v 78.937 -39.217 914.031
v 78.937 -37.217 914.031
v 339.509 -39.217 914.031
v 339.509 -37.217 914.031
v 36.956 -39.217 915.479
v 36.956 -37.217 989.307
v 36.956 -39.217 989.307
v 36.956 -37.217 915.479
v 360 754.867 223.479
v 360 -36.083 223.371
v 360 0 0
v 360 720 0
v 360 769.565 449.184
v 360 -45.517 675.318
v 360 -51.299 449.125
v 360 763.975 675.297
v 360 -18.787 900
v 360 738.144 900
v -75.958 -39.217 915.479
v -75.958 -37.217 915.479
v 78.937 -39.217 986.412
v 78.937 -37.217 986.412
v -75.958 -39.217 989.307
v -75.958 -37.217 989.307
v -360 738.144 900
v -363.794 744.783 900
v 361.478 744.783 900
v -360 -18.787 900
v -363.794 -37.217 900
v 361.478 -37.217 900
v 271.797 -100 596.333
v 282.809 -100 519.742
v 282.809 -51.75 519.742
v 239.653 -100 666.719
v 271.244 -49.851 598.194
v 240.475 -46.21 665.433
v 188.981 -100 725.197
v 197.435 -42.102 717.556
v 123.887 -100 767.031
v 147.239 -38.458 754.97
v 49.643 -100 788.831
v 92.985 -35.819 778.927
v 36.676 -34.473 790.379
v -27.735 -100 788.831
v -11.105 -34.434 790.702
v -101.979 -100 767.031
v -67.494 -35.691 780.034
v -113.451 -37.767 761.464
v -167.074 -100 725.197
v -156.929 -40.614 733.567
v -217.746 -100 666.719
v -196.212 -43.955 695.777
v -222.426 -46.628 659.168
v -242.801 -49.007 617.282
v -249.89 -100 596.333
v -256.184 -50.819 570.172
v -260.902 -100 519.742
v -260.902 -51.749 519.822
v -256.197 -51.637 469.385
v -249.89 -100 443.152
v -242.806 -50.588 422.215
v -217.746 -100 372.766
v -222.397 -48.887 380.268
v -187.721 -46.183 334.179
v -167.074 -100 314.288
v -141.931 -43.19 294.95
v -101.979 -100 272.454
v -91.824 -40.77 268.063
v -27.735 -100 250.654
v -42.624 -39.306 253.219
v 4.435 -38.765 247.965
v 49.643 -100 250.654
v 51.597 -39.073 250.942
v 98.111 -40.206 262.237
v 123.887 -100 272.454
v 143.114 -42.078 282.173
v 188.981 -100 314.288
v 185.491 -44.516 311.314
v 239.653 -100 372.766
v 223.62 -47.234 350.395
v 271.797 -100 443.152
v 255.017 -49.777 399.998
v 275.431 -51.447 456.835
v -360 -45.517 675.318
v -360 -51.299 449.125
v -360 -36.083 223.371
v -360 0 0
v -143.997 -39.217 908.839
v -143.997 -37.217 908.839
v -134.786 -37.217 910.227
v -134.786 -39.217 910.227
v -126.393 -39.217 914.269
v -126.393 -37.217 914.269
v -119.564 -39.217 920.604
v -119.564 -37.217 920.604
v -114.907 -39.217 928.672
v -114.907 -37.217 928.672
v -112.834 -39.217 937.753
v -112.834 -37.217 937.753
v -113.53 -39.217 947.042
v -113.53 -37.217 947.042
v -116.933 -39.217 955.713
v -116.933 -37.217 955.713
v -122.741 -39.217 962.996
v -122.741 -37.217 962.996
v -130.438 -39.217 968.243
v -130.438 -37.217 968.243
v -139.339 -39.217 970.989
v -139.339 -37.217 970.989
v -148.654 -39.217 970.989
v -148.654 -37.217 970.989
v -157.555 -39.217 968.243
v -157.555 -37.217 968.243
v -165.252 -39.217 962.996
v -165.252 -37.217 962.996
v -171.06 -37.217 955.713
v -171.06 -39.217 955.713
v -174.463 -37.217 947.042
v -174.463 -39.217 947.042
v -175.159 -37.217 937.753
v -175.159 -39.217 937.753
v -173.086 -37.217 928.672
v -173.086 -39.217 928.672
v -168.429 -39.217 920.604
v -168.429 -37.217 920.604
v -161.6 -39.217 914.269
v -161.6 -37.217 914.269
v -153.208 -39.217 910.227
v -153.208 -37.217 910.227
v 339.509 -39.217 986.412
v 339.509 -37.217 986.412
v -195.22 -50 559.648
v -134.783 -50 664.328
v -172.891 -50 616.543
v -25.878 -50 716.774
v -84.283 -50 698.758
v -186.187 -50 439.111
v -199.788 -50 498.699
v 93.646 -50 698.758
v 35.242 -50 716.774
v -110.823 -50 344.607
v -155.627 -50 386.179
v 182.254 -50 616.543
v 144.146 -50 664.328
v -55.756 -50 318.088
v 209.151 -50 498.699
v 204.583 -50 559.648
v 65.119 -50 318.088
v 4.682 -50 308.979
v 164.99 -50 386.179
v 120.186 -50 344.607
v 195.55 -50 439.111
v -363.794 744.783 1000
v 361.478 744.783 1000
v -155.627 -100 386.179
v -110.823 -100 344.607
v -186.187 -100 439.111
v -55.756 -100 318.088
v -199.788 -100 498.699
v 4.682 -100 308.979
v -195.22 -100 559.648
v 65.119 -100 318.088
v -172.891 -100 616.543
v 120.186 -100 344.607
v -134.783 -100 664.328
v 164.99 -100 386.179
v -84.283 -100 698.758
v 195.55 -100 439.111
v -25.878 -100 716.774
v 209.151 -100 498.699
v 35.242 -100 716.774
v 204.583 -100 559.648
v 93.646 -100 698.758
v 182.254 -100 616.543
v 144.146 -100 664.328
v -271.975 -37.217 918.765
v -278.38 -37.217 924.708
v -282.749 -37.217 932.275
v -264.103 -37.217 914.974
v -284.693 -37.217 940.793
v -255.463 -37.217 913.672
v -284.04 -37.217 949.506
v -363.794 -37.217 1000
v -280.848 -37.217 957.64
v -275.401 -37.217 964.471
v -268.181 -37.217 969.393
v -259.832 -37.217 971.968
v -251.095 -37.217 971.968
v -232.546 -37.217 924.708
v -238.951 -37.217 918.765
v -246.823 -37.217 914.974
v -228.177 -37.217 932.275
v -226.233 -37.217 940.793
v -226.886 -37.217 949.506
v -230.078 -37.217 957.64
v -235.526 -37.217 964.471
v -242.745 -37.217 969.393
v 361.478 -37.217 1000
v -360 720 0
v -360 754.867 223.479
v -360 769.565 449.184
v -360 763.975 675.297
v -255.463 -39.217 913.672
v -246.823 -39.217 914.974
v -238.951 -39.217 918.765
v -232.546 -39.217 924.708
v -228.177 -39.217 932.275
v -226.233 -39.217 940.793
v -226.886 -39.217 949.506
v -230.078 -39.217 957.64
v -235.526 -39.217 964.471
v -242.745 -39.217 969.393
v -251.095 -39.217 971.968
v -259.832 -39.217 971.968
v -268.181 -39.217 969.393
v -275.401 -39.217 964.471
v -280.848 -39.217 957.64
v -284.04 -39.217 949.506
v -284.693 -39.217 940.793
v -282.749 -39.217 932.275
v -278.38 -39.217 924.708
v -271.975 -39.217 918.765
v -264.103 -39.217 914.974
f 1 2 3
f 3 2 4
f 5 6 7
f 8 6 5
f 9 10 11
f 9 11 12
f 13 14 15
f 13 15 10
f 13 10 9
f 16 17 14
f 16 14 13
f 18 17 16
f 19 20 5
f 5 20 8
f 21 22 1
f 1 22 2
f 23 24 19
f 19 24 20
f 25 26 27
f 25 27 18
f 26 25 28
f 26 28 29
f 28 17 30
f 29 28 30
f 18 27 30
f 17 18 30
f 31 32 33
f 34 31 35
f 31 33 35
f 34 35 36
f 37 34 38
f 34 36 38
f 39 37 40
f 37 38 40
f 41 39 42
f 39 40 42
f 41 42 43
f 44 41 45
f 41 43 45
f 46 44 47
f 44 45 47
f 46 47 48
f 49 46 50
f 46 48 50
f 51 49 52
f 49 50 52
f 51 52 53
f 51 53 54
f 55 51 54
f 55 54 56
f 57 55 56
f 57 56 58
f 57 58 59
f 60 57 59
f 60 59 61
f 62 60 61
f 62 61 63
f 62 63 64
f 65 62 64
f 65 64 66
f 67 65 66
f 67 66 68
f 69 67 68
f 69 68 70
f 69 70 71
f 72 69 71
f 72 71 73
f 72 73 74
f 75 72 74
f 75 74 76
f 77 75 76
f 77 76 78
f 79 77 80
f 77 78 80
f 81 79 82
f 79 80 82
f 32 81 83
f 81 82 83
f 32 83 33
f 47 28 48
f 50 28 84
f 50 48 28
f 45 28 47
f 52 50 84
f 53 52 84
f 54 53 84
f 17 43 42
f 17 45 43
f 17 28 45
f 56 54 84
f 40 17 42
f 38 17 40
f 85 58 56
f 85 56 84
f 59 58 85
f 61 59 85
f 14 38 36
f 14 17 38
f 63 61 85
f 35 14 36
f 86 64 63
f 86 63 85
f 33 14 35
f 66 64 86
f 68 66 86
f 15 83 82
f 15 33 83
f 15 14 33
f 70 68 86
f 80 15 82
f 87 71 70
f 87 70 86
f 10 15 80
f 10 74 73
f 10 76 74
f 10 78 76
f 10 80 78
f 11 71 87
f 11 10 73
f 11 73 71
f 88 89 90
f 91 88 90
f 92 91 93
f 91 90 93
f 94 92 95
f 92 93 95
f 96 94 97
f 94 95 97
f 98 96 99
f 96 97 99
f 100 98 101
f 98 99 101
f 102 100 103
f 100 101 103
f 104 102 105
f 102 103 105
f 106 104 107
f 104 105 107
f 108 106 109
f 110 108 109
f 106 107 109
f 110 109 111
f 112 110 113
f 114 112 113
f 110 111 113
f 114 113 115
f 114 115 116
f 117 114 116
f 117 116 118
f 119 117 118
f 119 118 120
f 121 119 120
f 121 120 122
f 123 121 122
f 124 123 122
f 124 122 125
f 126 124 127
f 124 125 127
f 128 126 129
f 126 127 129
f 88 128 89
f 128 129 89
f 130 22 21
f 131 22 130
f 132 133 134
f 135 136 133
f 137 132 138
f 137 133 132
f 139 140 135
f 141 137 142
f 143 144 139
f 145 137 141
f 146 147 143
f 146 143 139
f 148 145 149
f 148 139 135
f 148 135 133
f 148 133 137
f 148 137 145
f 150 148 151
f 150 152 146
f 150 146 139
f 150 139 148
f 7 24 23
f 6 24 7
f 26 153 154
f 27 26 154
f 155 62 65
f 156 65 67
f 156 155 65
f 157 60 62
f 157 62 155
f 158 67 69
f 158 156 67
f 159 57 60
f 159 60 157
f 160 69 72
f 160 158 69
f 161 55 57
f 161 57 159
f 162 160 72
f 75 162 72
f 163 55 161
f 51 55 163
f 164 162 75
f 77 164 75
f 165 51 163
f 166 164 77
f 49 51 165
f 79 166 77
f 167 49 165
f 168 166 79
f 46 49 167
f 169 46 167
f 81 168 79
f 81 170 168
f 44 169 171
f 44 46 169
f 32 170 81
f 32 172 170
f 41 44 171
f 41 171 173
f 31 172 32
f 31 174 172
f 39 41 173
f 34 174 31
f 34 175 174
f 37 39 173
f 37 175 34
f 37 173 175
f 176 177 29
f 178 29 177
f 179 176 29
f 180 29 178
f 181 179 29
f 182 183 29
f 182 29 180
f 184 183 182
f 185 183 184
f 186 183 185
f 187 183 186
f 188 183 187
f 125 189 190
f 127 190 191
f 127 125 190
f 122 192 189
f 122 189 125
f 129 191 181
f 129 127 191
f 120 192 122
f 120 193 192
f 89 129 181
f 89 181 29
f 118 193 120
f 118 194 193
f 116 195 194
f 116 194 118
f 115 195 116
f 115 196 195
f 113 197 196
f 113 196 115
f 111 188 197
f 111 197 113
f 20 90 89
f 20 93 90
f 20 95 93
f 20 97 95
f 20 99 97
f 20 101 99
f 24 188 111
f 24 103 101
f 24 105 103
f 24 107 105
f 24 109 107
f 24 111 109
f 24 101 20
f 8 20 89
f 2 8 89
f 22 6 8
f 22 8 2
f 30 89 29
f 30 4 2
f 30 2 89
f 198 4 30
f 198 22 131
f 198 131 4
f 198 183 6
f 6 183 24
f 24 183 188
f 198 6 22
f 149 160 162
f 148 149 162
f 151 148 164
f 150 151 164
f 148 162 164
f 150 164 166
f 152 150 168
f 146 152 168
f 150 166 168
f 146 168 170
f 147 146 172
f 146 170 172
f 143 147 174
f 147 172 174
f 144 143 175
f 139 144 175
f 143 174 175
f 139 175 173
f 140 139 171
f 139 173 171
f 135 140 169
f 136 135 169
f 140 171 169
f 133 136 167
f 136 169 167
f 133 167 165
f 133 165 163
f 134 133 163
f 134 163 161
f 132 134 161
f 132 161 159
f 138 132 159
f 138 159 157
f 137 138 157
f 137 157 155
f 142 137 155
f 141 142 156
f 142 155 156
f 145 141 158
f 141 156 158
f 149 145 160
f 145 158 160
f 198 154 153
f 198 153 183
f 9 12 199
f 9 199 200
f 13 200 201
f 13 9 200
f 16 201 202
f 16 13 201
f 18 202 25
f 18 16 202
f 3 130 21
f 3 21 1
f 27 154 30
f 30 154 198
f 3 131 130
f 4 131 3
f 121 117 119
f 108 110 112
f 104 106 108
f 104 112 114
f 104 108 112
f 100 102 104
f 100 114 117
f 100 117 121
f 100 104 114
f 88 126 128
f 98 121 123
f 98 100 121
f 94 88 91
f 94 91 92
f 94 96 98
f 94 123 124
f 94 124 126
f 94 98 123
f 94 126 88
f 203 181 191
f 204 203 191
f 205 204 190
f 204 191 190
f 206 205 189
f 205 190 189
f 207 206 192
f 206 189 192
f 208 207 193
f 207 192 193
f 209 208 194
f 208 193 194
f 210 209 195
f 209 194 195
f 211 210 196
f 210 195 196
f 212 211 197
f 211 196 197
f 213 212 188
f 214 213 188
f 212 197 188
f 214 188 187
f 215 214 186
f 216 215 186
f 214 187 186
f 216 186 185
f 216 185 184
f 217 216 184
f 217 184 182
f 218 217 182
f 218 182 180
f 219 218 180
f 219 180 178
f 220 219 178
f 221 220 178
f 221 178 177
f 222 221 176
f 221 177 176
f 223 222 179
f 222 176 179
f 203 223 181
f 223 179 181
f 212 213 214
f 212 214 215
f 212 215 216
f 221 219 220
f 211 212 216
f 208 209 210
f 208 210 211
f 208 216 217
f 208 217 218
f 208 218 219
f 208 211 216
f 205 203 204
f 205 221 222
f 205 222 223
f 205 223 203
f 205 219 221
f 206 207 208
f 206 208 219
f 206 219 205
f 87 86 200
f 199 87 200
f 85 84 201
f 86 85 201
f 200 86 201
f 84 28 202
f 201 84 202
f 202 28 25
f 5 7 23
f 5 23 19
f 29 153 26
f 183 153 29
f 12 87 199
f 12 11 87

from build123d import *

# Parameters (mm, degrees)
PAD_DEPTH      = 360
PAD_DEPTH_BACK = 360
SKETCH001_R    = 271.855749
PAD001_DEPTH   = 100
SKETCH002_R    = 205.042507
POCKET_DEPTH   = 50
SKETCH003_W    = 782.000423
SKETCH003_H    = 725.272034
PAD002_DEPTH   = 100
SKETCH004_R    = 29.312065
SKETCH004_R_2  = 31.24981
SKETCH004_W    = 72.380981
SKETCH004_H    = 260.571579
SKETCH004_W_2  = 73.828552
SKETCH004_H_2  = 112.914345
PAD003_DEPTH   = 2


with BuildPart() as part:
    # Sketch → Pad (new body, two sides)
    with BuildSketch(Plane.YZ) as pad_sk:
        with BuildLine():
            Line((0, 0), (720, 0))
            ThreePointArc((720, 0), (770.07692, 500), (720, 1000))
            Line((0, 1000), (720, 1000))
            ThreePointArc((0, 1000), (-51.829558, 500), (0, 0))
        make_face()
    extrude(amount=PAD_DEPTH)
    extrude(pad_sk.sketch, amount=-PAD_DEPTH_BACK)

    # Sketch001 → Pad001 (join)
    with BuildSketch(Plane.XZ):
        with Locations((10.953636, 519.742493)):
            Circle(SKETCH001_R)
    extrude(amount=PAD001_DEPTH)

    # Sketch002 (on Face8 of Pad001) → Pocket (cut)
    with BuildSketch(Plane(origin=(0, -100, 0), x_dir=(0, 0, -1), z_dir=(0, -1, 0))):
        with Locations((-514.021362, 4.681509)):
            Circle(SKETCH002_R)
    extrude(amount=-POCKET_DEPTH, mode=Mode.SUBTRACT)

    # Sketch003 (on Face2 of Pocket) → Pad002 (join)
    with BuildSketch(Plane(origin=(0, 0, 1000), x_dir=(0, -1, 0), z_dir=(0, 0, 1))):
        with Locations((-353.783052, -1.157959)):
            Rectangle(SKETCH003_W, SKETCH003_H)
    extrude(amount=-PAD002_DEPTH)

    # Sketch004 (on Face4 of Pad002) → Pad003 (join)
    with BuildSketch(Plane(origin=(0, -37.217159, 0), x_dir=(0, 0, -1), z_dir=(0, -1, 0))):
        with Locations((-942.983643, -255.463287)):
            Circle(SKETCH004_R)
        with Locations((-940.088379, -143.996552)):
            Circle(SKETCH004_R_2)
        with Locations((-950.22174, 209.222724)):
            Rectangle(SKETCH004_W, SKETCH004_H)
        with Locations((-952.393158, -19.501239)):
            Rectangle(SKETCH004_W_2, SKETCH004_H_2)
    extrude(amount=PAD003_DEPTH)


solid = part.part
